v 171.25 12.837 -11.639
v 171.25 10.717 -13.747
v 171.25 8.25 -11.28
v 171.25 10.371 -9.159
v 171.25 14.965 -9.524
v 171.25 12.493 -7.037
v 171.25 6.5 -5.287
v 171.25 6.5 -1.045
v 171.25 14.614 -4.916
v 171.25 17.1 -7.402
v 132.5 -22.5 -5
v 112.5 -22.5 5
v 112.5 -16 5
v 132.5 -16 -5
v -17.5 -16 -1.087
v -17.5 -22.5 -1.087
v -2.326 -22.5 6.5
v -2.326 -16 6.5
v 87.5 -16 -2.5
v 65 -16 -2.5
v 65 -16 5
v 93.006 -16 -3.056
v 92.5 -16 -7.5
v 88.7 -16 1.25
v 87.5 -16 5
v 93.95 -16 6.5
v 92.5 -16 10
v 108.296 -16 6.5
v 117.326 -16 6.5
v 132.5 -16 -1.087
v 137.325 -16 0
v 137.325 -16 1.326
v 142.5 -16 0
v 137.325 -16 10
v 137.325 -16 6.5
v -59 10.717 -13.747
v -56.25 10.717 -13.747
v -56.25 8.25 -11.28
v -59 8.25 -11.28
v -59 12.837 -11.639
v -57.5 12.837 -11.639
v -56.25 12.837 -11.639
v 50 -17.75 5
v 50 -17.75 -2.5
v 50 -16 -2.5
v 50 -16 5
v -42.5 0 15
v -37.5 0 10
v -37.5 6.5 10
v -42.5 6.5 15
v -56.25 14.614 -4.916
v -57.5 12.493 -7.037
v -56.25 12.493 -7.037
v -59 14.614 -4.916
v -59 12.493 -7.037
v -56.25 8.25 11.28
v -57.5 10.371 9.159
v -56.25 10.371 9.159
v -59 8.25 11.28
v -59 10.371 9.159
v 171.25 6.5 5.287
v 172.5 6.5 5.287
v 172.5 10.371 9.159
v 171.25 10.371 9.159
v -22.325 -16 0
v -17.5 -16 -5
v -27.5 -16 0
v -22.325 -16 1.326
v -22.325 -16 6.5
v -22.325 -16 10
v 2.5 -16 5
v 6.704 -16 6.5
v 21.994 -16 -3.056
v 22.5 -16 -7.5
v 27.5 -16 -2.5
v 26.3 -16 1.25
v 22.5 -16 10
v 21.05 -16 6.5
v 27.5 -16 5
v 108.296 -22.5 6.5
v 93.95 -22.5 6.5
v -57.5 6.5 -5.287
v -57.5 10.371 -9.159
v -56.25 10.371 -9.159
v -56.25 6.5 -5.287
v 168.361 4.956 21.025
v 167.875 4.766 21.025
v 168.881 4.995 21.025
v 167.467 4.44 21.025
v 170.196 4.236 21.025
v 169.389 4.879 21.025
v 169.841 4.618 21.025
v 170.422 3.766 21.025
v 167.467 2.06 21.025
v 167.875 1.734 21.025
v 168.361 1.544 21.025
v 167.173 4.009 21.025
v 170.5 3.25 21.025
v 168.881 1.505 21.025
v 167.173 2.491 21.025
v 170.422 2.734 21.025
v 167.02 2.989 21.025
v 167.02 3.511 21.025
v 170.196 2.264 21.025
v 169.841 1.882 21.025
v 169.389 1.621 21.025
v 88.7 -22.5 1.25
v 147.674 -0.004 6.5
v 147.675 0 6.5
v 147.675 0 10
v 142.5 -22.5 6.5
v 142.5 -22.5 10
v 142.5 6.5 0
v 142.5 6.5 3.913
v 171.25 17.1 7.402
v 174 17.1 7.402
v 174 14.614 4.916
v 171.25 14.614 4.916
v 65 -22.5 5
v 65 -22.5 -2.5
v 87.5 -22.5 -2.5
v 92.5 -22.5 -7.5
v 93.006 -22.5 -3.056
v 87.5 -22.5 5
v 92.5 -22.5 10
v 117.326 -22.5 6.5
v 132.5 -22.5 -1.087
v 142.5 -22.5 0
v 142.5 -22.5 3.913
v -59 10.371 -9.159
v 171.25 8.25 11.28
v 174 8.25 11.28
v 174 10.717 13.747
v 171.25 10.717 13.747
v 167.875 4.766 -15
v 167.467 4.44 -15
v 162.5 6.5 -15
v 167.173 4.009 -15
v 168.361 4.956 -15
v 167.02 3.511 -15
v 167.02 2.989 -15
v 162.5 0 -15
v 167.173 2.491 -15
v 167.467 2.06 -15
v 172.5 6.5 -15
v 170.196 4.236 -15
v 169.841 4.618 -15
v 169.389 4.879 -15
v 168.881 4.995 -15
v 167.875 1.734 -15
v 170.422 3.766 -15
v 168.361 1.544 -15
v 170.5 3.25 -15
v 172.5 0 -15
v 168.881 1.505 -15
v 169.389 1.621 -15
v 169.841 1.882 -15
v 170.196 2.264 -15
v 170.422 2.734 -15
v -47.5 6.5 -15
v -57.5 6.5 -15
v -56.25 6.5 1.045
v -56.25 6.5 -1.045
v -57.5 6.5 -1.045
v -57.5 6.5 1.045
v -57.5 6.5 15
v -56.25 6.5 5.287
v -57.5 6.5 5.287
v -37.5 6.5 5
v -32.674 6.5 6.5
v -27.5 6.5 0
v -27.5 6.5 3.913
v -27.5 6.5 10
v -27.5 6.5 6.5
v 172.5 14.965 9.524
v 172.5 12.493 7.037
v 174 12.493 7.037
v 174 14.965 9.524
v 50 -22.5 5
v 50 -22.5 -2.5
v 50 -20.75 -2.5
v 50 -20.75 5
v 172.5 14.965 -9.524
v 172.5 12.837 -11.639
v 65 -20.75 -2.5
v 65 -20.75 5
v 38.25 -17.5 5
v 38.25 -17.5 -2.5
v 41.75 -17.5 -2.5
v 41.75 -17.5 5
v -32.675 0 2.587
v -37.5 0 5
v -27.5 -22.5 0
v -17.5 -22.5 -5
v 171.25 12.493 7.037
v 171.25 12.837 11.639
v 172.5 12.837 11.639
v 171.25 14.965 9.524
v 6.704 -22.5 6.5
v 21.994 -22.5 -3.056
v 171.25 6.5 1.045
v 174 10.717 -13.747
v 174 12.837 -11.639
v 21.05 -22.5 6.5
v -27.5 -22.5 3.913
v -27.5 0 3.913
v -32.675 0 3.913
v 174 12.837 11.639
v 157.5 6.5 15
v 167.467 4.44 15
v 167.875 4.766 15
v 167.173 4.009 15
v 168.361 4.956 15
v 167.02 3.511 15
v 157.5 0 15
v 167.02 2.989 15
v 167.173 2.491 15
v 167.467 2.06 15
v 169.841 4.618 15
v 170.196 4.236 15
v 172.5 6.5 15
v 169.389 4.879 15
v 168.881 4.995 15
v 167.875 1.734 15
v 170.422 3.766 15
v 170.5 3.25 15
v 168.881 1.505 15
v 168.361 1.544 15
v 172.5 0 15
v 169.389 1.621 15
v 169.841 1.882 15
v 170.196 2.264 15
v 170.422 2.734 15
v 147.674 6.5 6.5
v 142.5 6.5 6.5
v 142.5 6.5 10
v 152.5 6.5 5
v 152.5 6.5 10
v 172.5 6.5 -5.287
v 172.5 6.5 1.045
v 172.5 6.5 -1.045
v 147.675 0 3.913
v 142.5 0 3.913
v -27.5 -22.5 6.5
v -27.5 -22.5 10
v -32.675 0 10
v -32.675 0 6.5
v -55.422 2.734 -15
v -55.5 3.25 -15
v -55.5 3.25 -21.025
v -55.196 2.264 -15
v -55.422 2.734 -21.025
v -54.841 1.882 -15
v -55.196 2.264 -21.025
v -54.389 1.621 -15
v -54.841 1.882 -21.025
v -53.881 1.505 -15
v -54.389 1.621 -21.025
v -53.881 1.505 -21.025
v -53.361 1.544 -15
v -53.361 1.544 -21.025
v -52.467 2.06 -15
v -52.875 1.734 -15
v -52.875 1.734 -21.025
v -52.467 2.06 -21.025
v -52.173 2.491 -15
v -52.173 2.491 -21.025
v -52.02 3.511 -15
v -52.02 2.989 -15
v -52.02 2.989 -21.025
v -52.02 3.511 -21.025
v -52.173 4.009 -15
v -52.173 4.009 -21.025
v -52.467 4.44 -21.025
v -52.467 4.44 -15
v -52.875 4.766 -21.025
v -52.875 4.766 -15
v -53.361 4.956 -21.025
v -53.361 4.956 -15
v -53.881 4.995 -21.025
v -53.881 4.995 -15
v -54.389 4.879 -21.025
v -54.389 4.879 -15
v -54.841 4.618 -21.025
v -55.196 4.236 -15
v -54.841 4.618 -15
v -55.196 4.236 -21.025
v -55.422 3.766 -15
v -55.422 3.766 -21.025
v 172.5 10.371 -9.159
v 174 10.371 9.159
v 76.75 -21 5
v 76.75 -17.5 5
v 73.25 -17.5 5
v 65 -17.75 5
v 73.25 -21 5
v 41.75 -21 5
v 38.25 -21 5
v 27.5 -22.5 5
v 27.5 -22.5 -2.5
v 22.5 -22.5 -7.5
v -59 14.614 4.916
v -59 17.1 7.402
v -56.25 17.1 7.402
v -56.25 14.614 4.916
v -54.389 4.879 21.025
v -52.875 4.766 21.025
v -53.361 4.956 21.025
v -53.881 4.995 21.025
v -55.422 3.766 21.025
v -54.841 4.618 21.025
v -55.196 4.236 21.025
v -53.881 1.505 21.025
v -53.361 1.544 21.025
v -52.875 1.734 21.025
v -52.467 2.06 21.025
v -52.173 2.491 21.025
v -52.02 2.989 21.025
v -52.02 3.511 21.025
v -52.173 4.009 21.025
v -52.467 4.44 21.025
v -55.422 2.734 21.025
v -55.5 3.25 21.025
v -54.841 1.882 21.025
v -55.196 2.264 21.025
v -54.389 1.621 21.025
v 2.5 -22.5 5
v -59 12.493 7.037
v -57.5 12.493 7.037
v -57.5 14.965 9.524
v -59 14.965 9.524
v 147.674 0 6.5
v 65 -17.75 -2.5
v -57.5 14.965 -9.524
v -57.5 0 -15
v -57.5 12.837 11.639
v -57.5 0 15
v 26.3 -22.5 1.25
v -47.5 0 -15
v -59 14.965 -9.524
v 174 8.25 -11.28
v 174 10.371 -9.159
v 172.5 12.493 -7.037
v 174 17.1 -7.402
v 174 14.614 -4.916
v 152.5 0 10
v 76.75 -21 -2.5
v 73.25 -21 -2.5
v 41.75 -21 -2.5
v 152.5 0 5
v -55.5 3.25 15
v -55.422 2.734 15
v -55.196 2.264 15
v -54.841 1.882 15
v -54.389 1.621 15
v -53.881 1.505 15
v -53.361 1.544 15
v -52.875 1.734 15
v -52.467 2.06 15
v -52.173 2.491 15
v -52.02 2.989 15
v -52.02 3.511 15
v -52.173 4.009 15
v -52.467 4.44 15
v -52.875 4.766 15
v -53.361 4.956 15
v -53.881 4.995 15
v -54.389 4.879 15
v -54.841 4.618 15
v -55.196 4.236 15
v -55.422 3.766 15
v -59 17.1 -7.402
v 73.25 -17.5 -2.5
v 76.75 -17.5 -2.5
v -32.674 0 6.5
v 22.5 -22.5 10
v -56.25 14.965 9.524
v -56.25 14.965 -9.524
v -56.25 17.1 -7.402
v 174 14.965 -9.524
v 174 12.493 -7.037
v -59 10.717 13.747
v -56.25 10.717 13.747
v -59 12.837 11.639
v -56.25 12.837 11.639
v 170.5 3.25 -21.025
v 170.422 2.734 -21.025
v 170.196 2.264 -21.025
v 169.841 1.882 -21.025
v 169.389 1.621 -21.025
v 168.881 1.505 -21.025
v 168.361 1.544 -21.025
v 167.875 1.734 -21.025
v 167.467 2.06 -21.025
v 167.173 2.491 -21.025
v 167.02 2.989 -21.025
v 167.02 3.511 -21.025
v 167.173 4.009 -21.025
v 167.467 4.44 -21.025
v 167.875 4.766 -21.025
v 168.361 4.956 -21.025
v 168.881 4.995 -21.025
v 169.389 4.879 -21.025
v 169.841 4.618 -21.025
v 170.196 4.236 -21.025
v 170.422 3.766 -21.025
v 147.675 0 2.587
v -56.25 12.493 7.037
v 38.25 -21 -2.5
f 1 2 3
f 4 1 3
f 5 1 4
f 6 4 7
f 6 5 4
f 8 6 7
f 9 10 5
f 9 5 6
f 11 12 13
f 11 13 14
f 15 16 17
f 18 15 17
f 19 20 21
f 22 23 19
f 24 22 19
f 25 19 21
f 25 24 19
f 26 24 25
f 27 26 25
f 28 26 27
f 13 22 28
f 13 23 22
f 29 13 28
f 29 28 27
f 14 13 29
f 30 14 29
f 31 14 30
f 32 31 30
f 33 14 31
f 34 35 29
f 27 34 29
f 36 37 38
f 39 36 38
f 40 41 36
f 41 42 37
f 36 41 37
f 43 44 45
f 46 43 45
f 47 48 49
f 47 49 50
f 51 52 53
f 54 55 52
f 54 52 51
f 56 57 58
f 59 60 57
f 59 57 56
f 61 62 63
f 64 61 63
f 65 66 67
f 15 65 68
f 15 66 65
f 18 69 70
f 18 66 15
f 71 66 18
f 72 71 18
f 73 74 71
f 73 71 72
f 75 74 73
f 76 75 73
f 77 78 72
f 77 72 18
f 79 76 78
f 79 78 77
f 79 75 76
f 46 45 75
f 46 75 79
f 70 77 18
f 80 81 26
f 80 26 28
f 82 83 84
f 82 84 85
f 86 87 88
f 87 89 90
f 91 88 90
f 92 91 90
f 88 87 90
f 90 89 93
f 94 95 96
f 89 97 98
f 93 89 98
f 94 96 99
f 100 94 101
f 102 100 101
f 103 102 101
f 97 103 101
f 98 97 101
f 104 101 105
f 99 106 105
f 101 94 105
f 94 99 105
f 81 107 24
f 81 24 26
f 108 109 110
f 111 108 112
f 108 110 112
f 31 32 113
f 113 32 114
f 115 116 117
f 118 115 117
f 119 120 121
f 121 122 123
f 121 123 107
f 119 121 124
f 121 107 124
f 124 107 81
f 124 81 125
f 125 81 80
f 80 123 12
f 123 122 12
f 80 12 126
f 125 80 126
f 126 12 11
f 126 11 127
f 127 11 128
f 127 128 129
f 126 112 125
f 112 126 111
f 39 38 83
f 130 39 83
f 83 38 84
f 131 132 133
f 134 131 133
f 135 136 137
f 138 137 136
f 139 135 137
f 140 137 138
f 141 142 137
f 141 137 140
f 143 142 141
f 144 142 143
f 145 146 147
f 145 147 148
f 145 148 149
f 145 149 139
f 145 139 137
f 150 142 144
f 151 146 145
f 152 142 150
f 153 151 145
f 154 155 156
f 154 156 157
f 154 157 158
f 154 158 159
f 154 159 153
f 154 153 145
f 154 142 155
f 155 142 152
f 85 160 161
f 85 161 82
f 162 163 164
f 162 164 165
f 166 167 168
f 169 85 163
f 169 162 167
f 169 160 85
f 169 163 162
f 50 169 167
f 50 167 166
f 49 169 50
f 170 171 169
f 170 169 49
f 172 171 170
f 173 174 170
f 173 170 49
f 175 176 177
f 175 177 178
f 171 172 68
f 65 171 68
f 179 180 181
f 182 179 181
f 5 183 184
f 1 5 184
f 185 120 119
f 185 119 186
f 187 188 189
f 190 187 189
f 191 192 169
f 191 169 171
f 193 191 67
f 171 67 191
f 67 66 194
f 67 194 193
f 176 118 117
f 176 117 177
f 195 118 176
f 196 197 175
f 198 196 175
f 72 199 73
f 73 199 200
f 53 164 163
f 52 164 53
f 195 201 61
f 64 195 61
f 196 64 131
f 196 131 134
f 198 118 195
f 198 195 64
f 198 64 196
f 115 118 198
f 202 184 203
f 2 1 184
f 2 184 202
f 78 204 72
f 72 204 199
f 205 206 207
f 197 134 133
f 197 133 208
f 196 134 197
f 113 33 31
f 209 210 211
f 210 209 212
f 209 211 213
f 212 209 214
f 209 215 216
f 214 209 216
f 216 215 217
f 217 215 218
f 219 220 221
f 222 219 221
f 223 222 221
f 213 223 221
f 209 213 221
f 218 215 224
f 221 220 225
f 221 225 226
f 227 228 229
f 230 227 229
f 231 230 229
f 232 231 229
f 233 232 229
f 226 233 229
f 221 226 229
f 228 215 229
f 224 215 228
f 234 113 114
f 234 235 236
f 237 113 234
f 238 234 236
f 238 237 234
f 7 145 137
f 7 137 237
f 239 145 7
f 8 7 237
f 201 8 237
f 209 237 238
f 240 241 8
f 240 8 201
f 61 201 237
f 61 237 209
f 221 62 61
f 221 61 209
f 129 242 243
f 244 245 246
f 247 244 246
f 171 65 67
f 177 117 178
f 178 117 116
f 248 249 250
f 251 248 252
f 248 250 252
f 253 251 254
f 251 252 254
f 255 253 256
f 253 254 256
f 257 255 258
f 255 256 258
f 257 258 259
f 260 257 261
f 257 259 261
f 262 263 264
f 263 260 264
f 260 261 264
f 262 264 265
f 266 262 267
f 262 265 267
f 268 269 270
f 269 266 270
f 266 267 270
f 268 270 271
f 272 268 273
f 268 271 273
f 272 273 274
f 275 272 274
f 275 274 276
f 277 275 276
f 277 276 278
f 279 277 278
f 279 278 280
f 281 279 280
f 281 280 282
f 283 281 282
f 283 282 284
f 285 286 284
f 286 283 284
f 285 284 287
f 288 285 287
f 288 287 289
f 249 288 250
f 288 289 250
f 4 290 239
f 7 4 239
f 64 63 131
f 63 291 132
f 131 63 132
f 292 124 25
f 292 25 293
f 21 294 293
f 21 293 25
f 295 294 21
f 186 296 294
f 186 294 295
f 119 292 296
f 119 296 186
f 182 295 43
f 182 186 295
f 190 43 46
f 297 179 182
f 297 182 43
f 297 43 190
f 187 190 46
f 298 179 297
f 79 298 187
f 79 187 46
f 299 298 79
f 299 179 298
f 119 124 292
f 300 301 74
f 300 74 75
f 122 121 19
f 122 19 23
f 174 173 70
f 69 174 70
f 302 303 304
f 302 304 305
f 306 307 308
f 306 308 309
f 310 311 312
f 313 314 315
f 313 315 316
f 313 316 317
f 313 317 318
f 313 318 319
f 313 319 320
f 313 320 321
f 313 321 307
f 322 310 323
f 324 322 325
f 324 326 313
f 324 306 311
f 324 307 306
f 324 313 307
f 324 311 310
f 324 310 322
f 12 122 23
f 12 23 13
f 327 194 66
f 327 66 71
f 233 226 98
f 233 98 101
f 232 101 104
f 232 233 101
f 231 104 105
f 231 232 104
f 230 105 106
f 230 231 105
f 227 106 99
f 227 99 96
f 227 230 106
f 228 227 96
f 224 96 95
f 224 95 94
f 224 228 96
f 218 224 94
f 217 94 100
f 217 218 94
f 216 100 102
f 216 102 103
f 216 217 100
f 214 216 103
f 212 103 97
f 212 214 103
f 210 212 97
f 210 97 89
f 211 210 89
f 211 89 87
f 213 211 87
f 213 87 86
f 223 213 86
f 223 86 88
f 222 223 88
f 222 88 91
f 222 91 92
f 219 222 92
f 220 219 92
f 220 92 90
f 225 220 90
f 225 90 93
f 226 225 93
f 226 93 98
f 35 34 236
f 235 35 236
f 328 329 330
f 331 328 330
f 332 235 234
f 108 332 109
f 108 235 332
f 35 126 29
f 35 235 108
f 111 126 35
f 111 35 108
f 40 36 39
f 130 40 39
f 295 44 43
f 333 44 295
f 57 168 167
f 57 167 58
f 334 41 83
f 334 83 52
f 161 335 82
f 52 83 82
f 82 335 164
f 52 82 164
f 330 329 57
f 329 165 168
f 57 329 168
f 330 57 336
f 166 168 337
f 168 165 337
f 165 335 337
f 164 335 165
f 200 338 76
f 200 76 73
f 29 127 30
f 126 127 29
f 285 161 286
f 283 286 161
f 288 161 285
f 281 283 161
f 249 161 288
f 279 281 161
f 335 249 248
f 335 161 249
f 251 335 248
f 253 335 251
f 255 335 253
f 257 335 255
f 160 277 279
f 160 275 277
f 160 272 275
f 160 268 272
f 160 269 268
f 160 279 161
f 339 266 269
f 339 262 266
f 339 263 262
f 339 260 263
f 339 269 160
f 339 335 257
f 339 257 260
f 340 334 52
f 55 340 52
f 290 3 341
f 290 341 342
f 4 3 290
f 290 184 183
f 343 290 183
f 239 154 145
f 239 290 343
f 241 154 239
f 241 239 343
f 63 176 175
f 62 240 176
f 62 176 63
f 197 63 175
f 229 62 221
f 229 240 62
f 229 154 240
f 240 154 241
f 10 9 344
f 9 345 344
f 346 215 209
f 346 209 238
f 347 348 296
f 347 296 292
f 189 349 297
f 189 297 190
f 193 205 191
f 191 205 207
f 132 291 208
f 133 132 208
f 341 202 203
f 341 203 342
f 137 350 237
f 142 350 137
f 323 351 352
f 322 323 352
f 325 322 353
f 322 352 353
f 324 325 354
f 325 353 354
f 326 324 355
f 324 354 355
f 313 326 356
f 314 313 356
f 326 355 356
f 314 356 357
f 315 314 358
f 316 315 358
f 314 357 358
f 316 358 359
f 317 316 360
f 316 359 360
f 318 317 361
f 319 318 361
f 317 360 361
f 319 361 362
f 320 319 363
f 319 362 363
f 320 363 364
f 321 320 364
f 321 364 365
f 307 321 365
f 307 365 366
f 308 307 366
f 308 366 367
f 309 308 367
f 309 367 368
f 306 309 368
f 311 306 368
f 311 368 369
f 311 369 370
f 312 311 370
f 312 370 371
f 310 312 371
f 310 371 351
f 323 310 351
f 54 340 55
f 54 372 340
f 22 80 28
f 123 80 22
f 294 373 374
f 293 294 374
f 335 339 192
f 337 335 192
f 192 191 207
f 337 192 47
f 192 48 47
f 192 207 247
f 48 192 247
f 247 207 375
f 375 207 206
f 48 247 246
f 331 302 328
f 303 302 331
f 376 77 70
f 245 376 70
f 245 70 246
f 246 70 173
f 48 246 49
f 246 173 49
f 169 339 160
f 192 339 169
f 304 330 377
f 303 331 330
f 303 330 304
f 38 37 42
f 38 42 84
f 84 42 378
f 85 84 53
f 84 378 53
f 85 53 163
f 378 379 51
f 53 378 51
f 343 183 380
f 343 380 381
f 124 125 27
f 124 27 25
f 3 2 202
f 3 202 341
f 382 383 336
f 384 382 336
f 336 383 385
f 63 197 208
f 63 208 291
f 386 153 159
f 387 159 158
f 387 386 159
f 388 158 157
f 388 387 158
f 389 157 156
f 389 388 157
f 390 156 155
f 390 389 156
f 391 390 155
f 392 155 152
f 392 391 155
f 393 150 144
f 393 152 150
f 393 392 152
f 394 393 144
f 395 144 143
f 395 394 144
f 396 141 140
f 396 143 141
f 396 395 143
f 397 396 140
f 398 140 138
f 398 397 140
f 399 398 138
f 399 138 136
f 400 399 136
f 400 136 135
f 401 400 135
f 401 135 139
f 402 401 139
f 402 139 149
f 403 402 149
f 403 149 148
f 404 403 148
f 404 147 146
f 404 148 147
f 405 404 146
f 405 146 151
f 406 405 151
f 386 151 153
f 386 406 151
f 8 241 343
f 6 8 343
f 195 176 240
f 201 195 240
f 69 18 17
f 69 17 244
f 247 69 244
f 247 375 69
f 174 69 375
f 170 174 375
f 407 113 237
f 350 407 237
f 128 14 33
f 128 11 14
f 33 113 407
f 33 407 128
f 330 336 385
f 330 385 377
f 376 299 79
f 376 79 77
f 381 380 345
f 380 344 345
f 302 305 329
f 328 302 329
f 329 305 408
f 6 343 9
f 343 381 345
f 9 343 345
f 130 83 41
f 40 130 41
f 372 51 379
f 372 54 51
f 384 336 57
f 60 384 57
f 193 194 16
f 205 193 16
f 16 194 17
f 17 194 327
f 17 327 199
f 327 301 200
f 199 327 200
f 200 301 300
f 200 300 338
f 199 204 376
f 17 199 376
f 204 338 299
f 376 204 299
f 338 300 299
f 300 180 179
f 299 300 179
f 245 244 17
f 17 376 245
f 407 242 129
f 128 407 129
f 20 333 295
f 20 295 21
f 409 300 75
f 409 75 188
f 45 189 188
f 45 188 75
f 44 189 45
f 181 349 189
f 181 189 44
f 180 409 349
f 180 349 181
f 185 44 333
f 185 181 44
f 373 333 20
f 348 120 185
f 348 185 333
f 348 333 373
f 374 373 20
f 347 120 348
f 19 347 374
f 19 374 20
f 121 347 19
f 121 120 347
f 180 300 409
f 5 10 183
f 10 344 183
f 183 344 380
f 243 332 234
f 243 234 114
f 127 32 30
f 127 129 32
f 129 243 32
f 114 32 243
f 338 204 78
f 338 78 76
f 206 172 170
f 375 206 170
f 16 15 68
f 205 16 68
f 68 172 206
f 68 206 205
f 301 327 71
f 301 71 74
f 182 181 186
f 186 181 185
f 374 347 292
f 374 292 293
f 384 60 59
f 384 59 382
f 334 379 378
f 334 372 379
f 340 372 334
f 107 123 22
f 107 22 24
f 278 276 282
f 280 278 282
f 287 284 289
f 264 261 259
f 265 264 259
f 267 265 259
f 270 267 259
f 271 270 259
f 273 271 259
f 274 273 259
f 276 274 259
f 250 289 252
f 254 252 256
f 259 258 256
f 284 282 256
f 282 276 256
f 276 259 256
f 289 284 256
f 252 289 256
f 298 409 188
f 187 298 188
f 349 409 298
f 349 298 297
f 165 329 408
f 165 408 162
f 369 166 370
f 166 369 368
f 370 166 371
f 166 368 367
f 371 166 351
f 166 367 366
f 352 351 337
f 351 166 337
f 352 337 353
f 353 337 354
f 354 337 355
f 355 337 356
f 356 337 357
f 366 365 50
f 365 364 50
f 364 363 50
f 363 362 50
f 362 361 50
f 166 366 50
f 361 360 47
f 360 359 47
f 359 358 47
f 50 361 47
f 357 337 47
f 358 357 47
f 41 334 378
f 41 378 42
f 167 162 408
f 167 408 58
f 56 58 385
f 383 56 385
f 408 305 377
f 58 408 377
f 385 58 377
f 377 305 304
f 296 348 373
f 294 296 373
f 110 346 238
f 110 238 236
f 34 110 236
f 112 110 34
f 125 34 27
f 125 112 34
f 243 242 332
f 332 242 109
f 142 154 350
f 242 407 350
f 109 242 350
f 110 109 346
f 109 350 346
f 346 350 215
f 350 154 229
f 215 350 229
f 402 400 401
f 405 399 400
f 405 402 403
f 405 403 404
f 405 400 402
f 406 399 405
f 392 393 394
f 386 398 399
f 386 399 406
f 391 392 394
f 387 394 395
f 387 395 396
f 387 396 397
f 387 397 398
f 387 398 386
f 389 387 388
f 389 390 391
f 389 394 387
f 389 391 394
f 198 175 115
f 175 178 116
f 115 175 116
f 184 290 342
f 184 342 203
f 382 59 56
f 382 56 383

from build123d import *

# Parameters (mm, degrees)
SKETCH1_W                = 30
SKETCH1_H                = 115
BOSS_EXTRUDE1_DEPTH      = 6.5
BOSS_EXTRUDE2_DEPTH      = 21.025
BOSS_EXTRUDE2_DEPTH_BACK = 21.025
SKETCH2_R                = 1.75
BOSS_EXTRUDE3_DEPTH      = 1.25
BOSS_EXTRUDE4_DEPTH      = 1.5
CUT_EXTRUDE1_DEPTH       = 176.585884356
CUT_EXTRUDE1_DEPTH_BACK  = 176.585884356
SKETCH5_W                = 15
SKETCH5_H                = 3.5
SKETCH5_W_2              = 3.5
CUT_EXTRUDE3_DEPTH       = 179.511058418
SPLIT1_SURFACE_1_1_BACK  = 238.381
SPLIT1_SURFACE_1_1_DEPTH = 476.762
SPLIT1_SURFACE_1_2_BACK  = 238.381
SPLIT1_SURFACE_1_2_DEPTH = 476.762
SPLIT1_SURFACE_2_3_BACK  = 238.381
SPLIT1_SURFACE_2_3_DEPTH = 476.762
SPLIT1_SURFACE_2_4_BACK  = 238.381
SPLIT1_SURFACE_2_4_DEPTH = 476.762
BOSS_EXTRUDE10_DEPTH     = 3.5
BOSS_EXTRUDE11_START     = -6.08688
BOSS_EXTRUDE11_DEPTH     = 3.91312
CUT_EXTRUDE4_DEPTH       = 177.703991537
CUT_EXTRUDE4_DEPTH_BACK  = 177.703991537


with BuildPart() as part:
    # Sketch1 → Boss-Extrude1 (new body)
    with BuildSketch(Plane(origin=(0, 0, 0), x_dir=(0, 0, 1), z_dir=(0, -1, 0))):
        Rectangle(SKETCH1_W, SKETCH1_H)
    extrude(amount=-BOSS_EXTRUDE1_DEPTH)

    # Sketch2 → Boss-Extrude2 (add, two sides: drawn at the far end of the back side and taken through both)
    with BuildSketch(Plane.XY.offset(-BOSS_EXTRUDE2_DEPTH_BACK)):
        with Locations(Location((-53.75, 3.25, 0), (0, 0, 180))):
            Circle(SKETCH2_R)
    extrude(amount=BOSS_EXTRUDE2_DEPTH + BOSS_EXTRUDE2_DEPTH_BACK)

    # Sketch4 → Boss-Extrude3 (add)
    with BuildSketch(Plane.ZY.offset(57.5)):
        Polygon((-1.044718626, 6.5), (-5.287359313, 6.5), (0, 1.212640687), (5.287359313, 6.5), (1.044718626, 6.5), (0, 5.455281374), align=None)
        Polygon((7.037359313, 12.492640687), (1.044718626, 6.5), (5.287359313, 6.5), (9.158679656, 10.371320344), align=None)
        Polygon((9.524051427, 14.964876926), (7.037359313, 12.492640687), (9.158679656, 10.371320344), (11.639169892, 12.837390757), align=None)
        Polygon((4.916038969, 14.613961031), (7.037359313, 12.492640687), (9.524051427, 14.964876926), (7.401708122, 17.099630183), align=None)
        Polygon((11.639169892, 12.837390757), (9.158679656, 10.371320344), (11.28, 8.25), (13.747117437, 10.717117437), align=None)
        Polygon((-7.037359313, 12.492640687), (-9.158679656, 10.371320344), (-5.287359313, 6.5), (-1.044718626, 6.5), align=None)
        Polygon((-11.28, 8.25), (-9.158679656, 10.371320344), (-11.639169892, 12.837390757), (-13.747117437, 10.717117437), align=None)
        Polygon((-11.639169892, 12.837390757), (-9.158679656, 10.371320344), (-7.037359313, 12.492640687), (-9.524051427, 14.964876926), align=None)
        Polygon((-9.524051427, 14.964876926), (-7.037359313, 12.492640687), (-4.916038969, 14.613961031), (-7.401708122, 17.099630183), align=None)
    extrude(amount=-BOSS_EXTRUDE3_DEPTH)

    # Sketch4<3> → Boss-Extrude4 (add)
    with BuildSketch(Plane.ZY.offset(57.5)):
        Polygon((-11.28, 8.25), (-9.158679656, 10.371320344), (-11.639169892, 12.837390757), (-13.747117437, 10.717117437), align=None)
        Polygon((-9.524051427, 14.964876926), (-7.037359313, 12.492640687), (-4.916038969, 14.613961031), (-7.401708122, 17.099630183), align=None)
        Polygon((4.916038969, 14.613961031), (7.037359313, 12.492640687), (9.524051427, 14.964876926), (7.401708122, 17.099630183), align=None)
        Polygon((11.639169892, 12.837390757), (9.158679656, 10.371320344), (11.28, 8.25), (13.747117437, 10.717117437), align=None)
    extrude(amount=BOSS_EXTRUDE4_DEPTH)

    # Mirror1: part across plane


with BuildPart() as part_1:
    add(part.part)
    add(part.part.mirror(Plane(origin=(57.5, 0, 0), x_dir=(0, 0, 1), z_dir=(1, 0, 0))))

    # Sketch6 → Cut-Extrude1 (cut, two sides: drawn at the far end of the back side and taken through both)
    with BuildSketch(Plane(origin=(0, 6.5, 0), x_dir=(1, 0, 0), z_dir=(0, 1, 0)).offset(-CUT_EXTRUDE1_DEPTH_BACK)):
        Polygon((162.5, 15), (-47.5, 15), (-37.5, -5), (-17.5, 5), (2.5, -5), (22.5, 7.5), (27.5, 2.5), (87.5, 2.5), (92.5, 7.5), (112.5, -5), (132.5, 5), (152.5, -5), align=None)
        Polygon((87.5, -5), (27.5, -5), (22.5, -10), (-37.5, -10), (-42.5, -15), (157.5, -15), (152.5, -10), (92.5, -10), align=None)
        Polygon((-2.326237921, -6.5), (-32.673762079, -6.5), (-17.5, 1.086881039), align=None)
        Polygon((25.025126266, -2.525126266), (21.050252532, -6.5), (6.703786792, -6.5), (21.993919555, 3.056332977), (25.025126266, 0.025126266), (26.300252532, -1.25), align=None)
        Polygon((93.949747468, -6.5), (108.296213208, -6.5), (93.006080445, 3.056332977), (89.974873734, 0.025126266), (88.699747468, -1.25), (89.974873734, -2.525126266), align=None)
        Polygon((132.5, 1.086881039), (117.326237921, -6.5), (147.673762079, -6.5), align=None)
    extrude(amount=CUT_EXTRUDE1_DEPTH + CUT_EXTRUDE1_DEPTH_BACK, mode=Mode.SUBTRACT)

    # Sketch5 → Cut-Extrude3 (cut, through all)
    with BuildSketch(Plane.XY.offset(-15)):
        with Locations((57.5, 6.5)):
            Rectangle(SKETCH5_W, SKETCH5_H)
        with Locations((40, 3.25)):
            Rectangle(SKETCH5_W_2, SKETCH5_H)
        with Locations((75, 3.25)):
            Rectangle(SKETCH5_W_2, SKETCH5_H)
        with Locations((57.5, 0)):
            Rectangle(SKETCH5_W, SKETCH5_H)
    extrude(amount=CUT_EXTRUDE3_DEPTH, mode=Mode.SUBTRACT)


with BuildPart() as body_2:
    # Split1: the piece behind the surface
    add(part_1.part)
    # Split1 surface 1: a surface, the sketch's curves swept straight by 476.762 mm
    with BuildLine(Plane(origin=(0, 0, 0), x_dir=(1, 0, 0), z_dir=(0, 1, 0)).offset(-SPLIT1_SURFACE_1_1_BACK), mode=Mode.PRIVATE) as split1_surface_1_1_path:
        Line((-27.5, 9.688914823), (-27.5, -15.311085177))
    split1_surface_1_1 = Shell.extrude(split1_surface_1_1_path.wire(), (0 * SPLIT1_SURFACE_1_1_DEPTH, 1 * SPLIT1_SURFACE_1_1_DEPTH, 0 * SPLIT1_SURFACE_1_1_DEPTH))
    split(bisect_by=split1_surface_1_1, keep=Keep.BOTTOM)


with BuildPart() as part_2:
    add(part_1.part)

    # Split1: split by a surface, the side it looks to stays
    # Split1 surface 1: a surface, the sketch's curves swept straight by 476.762 mm
    with BuildLine(Plane(origin=(0, 0, 0), x_dir=(1, 0, 0), z_dir=(0, 1, 0)).offset(-SPLIT1_SURFACE_1_2_BACK), mode=Mode.PRIVATE) as split1_surface_1_2_path:
        Line((-27.5, 9.688914823), (-27.5, -15.311085177))
    split1_surface_1_2 = Shell.extrude(split1_surface_1_2_path.wire(), (0 * SPLIT1_SURFACE_1_2_DEPTH, 1 * SPLIT1_SURFACE_1_2_DEPTH, 0 * SPLIT1_SURFACE_1_2_DEPTH))
    split(bisect_by=split1_surface_1_2, keep=Keep.TOP)


with BuildPart() as body_3:
    # Split1 2: the piece behind the surface
    add(part_2.part)
    # Split1 surface 2: a surface, the sketch's curves swept straight by 476.762 mm
    with BuildLine(Plane(origin=(0, 0, 0), x_dir=(1, 0, 0), z_dir=(0, 1, 0)).offset(-SPLIT1_SURFACE_2_3_BACK), mode=Mode.PRIVATE) as split1_surface_2_3_path:
        Line((142.5, 6.689515731), (142.5, -18.310484269))
    split1_surface_2_3 = Shell.extrude(split1_surface_2_3_path.wire(), (0 * SPLIT1_SURFACE_2_3_DEPTH, 1 * SPLIT1_SURFACE_2_3_DEPTH, 0 * SPLIT1_SURFACE_2_3_DEPTH))
    split(bisect_by=split1_surface_2_3, keep=Keep.BOTTOM)


with BuildPart() as part_3:
    add(part_2.part)

    # Split1 2: split by a surface, the side it looks to stays
    # Split1 surface 2: a surface, the sketch's curves swept straight by 476.762 mm
    with BuildLine(Plane(origin=(0, 0, 0), x_dir=(1, 0, 0), z_dir=(0, 1, 0)).offset(-SPLIT1_SURFACE_2_4_BACK), mode=Mode.PRIVATE) as split1_surface_2_4_path:
        Line((142.5, 6.689515731), (142.5, -18.310484269))
    split1_surface_2_4 = Shell.extrude(split1_surface_2_4_path.wire(), (0 * SPLIT1_SURFACE_2_4_DEPTH, 1 * SPLIT1_SURFACE_2_4_DEPTH, 0 * SPLIT1_SURFACE_2_4_DEPTH))
    split(bisect_by=split1_surface_2_4, keep=Keep.TOP)

    add(body_2.part)  # Boss-Extrude10 merges body 2


with BuildPart() as body_3_1:
    # Body-Move/Copy1: moved
    add(body_3.part.moved(Location((0, -22.5, 0))))


with BuildPart() as part_4:
    add(part_3.part)

    add(body_3_1.part)  # Boss-Extrude10 merges body 3
    # Sketch9 → Boss-Extrude10 (add)
    with BuildSketch(Plane.XY.offset(10)):
        Polygon((-27.5, -22.5), (-32.674762701, 0), (-27.5, 6.5), (-22.325237299, -16), align=None)
        Polygon((142.5, -22.5), (137.325237299, -16), (142.5, 6.5), (147.674762701, 0), align=None)
    extrude(amount=-BOSS_EXTRUDE10_DEPTH)

    # Sketch9<3> → Boss-Extrude11 (add)
    with BuildSketch(Plane.XY.offset(10).offset(BOSS_EXTRUDE11_START)):
        Polygon((-27.5, -22.5), (-32.674762701, 0), (-27.5, 6.5), (-22.325237299, -16), align=None)
        Polygon((142.5, -22.5), (137.325237299, -16), (142.5, 6.5), (147.674762701, 0), align=None)
    extrude(amount=-BOSS_EXTRUDE11_DEPTH)

    # Sketch11 → Cut-Extrude4 (cut, two sides: drawn at the far end of the back side and taken through both)
    with BuildSketch(Plane(origin=(0, 0, 0), x_dir=(1, 0, 0), z_dir=(0, 1, 0)).offset(-CUT_EXTRUDE4_DEPTH_BACK)):
        Polygon((-37.5, -5), (-17.5, 5), (-19.736067977, 9.472135955), (-39.736067977, -0.527864045), align=None)
        Polygon((-17.5, 1.086881039), (-32.673762079, -6.5), (-2.326237921, -6.5), align=None)
        Polygon((117.326237921, -6.5), (132.5, 1.086881039), (147.673762079, -6.5), align=None)
        Polygon((154.736067977, -0.527864045), (152.5, -5), (132.5, 5), (134.736067977, 9.472135955), align=None)
    extrude(amount=CUT_EXTRUDE4_DEPTH + CUT_EXTRUDE4_DEPTH_BACK, mode=Mode.SUBTRACT)


solid = part_4.part
